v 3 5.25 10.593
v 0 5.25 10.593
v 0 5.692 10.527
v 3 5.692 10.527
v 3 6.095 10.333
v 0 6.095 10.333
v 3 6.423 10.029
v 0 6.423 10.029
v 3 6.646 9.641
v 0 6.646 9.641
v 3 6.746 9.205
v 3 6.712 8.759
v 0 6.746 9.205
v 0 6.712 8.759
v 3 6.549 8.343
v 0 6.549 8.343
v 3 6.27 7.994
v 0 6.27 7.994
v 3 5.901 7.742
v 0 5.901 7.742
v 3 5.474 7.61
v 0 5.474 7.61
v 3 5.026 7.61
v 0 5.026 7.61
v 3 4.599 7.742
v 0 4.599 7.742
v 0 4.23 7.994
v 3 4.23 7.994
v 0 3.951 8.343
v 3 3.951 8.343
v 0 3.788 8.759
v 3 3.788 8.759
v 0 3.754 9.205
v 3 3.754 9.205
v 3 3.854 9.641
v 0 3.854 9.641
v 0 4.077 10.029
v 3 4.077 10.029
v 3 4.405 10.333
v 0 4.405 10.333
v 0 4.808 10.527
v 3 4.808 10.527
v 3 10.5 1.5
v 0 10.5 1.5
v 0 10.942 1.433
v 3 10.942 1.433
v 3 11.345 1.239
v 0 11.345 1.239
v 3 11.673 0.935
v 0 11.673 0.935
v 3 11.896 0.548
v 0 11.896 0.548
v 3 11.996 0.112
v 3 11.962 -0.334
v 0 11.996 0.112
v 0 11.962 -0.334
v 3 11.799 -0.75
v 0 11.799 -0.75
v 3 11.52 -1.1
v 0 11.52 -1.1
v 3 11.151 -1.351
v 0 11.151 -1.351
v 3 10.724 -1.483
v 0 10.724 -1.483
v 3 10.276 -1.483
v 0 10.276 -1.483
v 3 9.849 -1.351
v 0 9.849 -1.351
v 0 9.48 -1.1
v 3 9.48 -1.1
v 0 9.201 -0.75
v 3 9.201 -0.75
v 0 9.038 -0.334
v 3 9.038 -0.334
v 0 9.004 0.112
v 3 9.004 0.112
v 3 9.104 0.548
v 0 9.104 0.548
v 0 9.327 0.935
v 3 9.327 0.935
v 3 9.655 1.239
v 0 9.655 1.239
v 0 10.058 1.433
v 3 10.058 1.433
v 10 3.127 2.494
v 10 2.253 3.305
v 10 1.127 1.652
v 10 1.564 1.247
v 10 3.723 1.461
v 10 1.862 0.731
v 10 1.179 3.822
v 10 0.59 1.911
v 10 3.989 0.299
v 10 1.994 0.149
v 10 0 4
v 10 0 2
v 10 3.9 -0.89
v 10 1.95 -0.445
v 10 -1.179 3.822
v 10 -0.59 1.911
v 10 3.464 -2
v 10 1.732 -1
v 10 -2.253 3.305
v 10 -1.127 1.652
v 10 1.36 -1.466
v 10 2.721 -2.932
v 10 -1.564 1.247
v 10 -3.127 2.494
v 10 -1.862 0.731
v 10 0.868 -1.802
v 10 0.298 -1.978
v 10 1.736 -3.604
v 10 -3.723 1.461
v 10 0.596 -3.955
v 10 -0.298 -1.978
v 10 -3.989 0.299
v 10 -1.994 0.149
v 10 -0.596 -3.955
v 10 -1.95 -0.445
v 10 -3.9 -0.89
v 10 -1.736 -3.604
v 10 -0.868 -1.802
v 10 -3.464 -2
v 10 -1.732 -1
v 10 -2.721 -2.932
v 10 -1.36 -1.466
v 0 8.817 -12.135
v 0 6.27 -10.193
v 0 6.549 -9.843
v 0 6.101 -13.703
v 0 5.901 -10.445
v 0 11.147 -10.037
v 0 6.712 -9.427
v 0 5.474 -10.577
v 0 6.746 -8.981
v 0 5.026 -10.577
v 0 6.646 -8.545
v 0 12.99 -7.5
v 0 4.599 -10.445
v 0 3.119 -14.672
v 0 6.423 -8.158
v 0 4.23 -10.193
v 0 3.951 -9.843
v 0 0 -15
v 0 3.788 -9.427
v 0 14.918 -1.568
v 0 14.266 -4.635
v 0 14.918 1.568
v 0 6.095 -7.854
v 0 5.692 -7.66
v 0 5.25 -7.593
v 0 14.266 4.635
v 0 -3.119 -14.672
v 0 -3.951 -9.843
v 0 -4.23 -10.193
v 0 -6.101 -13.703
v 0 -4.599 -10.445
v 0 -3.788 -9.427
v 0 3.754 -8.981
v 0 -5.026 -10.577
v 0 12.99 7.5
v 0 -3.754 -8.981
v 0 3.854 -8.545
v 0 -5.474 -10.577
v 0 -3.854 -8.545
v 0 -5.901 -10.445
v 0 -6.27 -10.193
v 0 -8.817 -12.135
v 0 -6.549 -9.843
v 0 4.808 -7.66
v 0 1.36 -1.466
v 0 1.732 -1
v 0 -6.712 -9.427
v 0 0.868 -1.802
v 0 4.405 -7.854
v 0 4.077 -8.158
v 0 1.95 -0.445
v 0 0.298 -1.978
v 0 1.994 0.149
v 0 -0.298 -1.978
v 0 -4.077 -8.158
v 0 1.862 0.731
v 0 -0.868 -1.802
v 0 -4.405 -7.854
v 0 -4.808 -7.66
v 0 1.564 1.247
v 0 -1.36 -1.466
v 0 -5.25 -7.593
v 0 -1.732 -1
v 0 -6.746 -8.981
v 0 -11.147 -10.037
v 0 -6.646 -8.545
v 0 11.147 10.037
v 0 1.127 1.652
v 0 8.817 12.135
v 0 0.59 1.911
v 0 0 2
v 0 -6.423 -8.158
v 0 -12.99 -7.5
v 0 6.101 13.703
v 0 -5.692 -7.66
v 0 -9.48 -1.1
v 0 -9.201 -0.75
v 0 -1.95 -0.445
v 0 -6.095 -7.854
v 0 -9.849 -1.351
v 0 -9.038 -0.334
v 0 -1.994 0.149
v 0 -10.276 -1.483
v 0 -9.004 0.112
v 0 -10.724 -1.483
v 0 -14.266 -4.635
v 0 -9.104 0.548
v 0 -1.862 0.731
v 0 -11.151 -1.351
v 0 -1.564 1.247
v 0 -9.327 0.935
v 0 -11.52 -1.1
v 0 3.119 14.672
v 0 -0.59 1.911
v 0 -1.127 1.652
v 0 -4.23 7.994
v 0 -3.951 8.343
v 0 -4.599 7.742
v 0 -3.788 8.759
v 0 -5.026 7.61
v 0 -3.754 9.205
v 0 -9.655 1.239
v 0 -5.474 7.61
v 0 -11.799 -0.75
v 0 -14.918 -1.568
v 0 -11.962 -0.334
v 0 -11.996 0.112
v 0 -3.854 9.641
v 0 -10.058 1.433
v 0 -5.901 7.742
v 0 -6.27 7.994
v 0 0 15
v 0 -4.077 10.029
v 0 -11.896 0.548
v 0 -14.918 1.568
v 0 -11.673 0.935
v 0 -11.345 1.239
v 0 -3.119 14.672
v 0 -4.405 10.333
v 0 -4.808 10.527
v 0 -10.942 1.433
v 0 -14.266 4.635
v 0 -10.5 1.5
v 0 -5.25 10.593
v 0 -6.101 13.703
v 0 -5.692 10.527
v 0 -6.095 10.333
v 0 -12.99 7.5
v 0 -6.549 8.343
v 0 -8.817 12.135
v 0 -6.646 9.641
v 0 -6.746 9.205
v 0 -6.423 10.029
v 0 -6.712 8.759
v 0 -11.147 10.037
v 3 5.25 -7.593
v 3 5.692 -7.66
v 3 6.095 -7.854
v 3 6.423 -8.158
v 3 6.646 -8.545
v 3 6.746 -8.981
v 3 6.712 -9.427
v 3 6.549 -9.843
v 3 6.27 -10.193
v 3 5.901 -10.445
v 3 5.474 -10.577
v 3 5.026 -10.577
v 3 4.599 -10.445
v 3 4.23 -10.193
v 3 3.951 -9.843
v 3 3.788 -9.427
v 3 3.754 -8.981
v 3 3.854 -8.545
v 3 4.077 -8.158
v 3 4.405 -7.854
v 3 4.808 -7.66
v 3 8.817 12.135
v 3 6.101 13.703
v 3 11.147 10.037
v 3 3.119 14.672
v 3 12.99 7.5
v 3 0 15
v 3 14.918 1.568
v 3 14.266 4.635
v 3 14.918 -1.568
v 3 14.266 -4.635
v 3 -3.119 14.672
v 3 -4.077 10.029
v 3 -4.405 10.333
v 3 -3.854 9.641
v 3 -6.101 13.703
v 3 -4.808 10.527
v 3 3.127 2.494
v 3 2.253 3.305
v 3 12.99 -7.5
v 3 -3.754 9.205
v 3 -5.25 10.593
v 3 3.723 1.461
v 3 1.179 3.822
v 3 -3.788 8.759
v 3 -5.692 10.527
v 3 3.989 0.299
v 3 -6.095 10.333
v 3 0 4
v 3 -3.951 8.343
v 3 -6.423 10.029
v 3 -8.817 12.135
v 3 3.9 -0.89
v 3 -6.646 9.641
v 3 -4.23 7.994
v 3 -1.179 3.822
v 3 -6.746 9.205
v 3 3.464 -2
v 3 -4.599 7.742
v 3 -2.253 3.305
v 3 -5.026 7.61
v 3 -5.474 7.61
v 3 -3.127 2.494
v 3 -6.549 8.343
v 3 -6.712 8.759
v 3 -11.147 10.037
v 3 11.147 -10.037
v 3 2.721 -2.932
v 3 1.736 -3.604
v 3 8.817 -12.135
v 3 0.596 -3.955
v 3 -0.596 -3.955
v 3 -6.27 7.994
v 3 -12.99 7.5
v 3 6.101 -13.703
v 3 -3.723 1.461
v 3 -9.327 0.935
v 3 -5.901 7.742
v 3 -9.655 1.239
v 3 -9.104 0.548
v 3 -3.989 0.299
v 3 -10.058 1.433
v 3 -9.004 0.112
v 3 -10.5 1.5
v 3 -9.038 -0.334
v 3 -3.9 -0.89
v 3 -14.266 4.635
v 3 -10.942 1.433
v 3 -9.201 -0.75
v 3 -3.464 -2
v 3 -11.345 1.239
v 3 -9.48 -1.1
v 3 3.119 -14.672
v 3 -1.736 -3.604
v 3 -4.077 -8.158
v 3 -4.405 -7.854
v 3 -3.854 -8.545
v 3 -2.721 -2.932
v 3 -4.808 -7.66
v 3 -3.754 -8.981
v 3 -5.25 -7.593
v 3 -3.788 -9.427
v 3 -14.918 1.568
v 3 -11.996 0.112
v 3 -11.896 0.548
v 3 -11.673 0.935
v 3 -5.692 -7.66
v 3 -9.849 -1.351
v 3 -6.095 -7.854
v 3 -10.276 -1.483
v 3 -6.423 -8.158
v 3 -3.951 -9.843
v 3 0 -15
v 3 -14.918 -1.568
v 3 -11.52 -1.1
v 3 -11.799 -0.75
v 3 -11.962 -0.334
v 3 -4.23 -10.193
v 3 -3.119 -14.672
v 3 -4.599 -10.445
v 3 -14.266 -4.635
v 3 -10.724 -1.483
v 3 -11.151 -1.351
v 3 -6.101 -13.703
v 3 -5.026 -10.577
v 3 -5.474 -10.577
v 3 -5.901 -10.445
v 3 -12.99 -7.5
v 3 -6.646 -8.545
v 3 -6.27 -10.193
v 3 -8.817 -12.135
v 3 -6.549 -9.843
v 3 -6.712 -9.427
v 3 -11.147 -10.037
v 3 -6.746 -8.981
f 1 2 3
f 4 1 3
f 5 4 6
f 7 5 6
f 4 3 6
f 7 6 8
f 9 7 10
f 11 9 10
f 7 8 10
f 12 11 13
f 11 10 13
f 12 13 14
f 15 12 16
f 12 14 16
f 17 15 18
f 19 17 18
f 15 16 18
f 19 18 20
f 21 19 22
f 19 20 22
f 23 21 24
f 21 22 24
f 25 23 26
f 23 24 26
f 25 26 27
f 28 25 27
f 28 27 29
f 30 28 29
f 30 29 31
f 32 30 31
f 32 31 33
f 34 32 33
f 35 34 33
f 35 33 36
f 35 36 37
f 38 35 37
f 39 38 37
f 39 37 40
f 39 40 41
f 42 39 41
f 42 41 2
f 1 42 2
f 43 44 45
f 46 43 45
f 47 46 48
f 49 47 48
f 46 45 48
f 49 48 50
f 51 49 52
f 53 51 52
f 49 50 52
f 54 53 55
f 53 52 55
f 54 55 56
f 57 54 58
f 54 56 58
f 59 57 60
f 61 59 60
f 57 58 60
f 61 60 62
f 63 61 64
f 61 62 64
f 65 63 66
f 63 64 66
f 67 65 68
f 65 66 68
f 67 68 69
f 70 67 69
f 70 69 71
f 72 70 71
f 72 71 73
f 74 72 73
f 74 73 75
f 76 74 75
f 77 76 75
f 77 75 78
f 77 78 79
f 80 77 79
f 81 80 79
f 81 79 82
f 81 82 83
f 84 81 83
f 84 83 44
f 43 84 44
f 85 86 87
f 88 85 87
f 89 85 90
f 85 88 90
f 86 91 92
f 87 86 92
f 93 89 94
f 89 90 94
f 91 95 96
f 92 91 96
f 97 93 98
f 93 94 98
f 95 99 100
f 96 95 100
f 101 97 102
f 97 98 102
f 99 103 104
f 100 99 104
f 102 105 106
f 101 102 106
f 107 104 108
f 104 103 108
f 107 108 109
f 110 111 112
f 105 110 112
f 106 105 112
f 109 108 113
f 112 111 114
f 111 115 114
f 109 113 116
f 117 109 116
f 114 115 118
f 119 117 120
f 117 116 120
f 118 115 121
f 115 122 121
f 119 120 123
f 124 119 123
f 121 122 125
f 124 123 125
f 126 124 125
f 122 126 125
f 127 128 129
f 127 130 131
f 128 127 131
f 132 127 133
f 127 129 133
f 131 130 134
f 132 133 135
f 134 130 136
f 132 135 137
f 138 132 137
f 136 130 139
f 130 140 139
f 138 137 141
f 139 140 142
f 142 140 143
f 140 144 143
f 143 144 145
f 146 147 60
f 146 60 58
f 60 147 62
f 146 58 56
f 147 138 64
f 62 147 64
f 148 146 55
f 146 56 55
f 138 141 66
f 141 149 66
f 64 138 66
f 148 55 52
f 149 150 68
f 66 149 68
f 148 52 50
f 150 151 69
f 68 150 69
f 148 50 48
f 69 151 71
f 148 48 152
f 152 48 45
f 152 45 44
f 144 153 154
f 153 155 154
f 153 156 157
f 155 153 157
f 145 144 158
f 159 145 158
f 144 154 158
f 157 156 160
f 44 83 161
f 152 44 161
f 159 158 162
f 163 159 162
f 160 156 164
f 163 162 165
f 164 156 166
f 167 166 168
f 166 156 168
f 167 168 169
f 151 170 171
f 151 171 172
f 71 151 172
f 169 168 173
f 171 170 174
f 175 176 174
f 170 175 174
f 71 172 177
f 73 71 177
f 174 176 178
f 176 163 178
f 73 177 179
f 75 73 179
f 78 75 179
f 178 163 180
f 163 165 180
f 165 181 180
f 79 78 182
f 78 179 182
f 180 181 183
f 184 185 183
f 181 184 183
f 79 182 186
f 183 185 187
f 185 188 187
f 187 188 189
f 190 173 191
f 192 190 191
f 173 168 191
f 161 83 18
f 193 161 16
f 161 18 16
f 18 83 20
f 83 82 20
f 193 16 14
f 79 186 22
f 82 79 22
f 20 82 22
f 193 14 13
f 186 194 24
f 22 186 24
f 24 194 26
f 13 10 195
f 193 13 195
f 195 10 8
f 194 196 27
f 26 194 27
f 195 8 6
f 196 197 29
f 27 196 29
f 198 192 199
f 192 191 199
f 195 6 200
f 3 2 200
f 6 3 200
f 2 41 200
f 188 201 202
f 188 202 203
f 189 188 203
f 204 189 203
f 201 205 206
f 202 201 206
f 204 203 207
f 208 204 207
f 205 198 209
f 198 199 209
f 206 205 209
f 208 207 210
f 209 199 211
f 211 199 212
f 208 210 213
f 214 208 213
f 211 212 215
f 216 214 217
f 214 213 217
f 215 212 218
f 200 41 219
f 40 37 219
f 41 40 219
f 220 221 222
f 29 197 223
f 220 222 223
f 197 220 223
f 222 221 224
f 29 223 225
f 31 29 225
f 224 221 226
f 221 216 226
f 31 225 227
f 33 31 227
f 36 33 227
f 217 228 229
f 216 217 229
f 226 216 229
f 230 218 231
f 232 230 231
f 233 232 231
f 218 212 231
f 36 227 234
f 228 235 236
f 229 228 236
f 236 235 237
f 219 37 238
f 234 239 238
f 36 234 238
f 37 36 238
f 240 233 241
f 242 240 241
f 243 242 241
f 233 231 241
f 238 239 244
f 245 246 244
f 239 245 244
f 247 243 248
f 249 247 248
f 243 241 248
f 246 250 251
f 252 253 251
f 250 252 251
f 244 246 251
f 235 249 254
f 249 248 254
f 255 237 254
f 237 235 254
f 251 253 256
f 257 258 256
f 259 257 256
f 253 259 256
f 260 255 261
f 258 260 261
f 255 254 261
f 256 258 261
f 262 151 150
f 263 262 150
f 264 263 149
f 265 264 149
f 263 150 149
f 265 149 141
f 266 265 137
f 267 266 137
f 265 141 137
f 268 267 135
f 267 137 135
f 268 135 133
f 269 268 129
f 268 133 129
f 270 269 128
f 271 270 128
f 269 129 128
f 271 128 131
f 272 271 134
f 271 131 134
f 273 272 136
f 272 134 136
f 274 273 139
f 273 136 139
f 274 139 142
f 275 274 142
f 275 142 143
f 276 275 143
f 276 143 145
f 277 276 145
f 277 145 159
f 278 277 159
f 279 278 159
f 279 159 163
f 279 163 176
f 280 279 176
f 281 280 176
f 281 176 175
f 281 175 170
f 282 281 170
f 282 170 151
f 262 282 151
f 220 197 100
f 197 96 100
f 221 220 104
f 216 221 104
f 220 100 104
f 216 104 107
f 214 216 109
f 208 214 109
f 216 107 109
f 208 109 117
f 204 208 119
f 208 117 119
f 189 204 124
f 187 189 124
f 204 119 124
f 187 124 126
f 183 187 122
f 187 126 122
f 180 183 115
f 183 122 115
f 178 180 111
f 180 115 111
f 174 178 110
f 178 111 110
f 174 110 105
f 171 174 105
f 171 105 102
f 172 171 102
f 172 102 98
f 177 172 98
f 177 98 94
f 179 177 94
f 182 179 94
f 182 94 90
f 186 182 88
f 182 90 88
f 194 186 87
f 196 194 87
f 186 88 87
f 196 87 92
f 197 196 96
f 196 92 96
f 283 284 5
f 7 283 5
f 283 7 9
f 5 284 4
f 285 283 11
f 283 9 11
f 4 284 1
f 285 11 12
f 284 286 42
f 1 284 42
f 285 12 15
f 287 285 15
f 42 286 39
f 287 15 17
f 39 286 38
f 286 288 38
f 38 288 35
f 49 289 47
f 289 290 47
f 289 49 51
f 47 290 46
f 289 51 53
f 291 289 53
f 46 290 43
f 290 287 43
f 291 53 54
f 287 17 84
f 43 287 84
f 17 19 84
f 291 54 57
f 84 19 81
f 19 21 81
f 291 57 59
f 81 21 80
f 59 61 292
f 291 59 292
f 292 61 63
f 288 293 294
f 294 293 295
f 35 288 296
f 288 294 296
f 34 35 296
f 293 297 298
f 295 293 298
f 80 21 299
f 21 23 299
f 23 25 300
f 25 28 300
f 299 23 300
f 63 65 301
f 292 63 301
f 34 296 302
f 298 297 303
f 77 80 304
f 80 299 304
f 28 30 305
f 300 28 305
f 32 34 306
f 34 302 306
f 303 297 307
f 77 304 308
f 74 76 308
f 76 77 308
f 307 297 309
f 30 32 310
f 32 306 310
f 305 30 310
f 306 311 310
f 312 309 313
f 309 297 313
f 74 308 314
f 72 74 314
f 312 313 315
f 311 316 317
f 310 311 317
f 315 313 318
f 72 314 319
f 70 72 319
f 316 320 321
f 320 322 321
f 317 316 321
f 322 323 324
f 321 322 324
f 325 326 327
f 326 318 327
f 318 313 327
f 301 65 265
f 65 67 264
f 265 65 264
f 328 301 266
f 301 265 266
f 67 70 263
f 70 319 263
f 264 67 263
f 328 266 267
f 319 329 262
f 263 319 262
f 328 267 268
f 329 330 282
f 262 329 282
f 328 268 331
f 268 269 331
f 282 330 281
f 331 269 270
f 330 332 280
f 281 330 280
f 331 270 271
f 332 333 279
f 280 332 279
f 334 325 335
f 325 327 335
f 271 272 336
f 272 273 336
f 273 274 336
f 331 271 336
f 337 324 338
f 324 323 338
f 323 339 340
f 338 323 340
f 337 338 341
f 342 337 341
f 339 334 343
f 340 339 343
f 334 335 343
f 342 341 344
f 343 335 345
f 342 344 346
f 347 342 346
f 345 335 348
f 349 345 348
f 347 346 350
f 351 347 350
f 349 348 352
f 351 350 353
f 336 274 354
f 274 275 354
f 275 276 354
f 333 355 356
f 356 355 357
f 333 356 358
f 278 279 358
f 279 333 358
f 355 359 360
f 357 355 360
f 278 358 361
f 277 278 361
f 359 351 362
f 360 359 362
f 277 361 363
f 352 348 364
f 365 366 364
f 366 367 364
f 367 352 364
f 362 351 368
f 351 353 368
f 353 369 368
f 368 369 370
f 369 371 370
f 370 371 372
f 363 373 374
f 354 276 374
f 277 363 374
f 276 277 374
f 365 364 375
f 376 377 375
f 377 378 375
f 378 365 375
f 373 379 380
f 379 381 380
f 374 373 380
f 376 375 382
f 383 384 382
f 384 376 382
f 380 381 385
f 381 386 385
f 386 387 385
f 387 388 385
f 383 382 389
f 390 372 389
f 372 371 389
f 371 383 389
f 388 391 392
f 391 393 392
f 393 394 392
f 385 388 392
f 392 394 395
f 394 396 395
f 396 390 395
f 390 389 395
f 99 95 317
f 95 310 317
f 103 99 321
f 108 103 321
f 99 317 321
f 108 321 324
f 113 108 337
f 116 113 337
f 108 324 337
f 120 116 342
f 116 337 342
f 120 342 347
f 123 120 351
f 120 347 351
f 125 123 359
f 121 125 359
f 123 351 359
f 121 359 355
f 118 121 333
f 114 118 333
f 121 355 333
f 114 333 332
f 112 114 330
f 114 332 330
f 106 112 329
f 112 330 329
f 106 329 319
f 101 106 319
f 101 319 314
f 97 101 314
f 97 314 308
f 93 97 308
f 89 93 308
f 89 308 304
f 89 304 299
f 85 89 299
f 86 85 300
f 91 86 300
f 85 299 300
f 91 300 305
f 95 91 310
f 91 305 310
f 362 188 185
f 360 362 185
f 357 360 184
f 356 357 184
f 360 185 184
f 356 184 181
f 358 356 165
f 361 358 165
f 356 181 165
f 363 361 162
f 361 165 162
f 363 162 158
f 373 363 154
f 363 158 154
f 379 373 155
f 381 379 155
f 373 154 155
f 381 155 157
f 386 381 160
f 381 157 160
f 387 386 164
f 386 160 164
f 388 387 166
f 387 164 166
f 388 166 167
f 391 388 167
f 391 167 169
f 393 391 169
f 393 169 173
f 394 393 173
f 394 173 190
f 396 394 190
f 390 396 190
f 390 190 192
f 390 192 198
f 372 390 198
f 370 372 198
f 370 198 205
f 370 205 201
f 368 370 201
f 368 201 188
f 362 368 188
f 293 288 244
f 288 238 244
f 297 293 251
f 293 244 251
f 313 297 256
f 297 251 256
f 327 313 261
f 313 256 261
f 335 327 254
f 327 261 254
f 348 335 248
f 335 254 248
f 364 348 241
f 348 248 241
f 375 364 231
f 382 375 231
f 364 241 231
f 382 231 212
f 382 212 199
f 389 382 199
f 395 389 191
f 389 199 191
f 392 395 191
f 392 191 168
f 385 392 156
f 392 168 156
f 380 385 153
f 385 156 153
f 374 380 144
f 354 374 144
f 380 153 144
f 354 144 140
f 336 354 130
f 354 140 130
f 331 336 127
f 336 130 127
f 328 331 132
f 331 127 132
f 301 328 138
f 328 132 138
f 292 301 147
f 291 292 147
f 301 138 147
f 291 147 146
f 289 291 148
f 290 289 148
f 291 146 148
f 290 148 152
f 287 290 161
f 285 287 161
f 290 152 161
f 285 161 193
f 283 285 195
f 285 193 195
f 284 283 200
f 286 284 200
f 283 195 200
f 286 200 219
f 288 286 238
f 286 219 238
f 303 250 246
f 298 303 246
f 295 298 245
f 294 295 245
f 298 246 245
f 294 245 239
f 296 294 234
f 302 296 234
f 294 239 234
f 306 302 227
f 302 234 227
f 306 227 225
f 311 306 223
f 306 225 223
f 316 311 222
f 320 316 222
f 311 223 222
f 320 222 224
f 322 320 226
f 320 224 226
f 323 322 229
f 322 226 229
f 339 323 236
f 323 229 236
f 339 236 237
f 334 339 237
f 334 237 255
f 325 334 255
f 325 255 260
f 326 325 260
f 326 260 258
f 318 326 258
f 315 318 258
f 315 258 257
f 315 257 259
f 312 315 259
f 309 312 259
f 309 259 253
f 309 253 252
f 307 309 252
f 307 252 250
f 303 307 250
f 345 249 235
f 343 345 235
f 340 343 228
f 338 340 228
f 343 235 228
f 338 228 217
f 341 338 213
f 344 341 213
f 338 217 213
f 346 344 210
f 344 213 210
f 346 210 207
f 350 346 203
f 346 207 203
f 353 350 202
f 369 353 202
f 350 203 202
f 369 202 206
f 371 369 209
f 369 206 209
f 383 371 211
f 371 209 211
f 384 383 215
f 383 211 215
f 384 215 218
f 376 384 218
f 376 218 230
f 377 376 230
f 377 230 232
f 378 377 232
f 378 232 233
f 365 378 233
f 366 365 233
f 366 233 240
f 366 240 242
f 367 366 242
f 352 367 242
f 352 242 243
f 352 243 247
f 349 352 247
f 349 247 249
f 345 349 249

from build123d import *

# Parameters (mm, degrees)
SKETCH2_R          = 1.5
CUT_EXTRUDE5_DEPTH = 24.452078799


with BuildPart() as part:
    # Sketch1 → Revolve1 (revolve)
    with BuildSketch(Plane.XY, mode=Mode.PRIVATE) as revolve1_sk:
        Polygon((10, 4), (3, 4), (3, 15), (0, 15), (0, 2), (10, 2), align=None)
    revolve(revolve1_sk.sketch.rotate(Axis((0, 0, 0), (1, 0, 0)), 90), axis=Axis((0, 0, 0), (1, 0, 0)))

    # Sketch2 → Cut-Extrude5 (cut, through all)
    with BuildSketch(Plane.ZY):
        with Locations((0, 10.5)):
            Circle(SKETCH2_R)
        with Locations((9.09326674, 5.25)):
            Circle(SKETCH2_R)
        with Locations((9.09326674, -5.25)):
            Circle(SKETCH2_R)
        with Locations((0, -10.5)):
            Circle(SKETCH2_R)
        with Locations((-9.09326674, -5.25)):
            Circle(SKETCH2_R)
        with Locations((-9.09326674, 5.25)):
            Circle(SKETCH2_R)
    extrude(amount=-CUT_EXTRUDE5_DEPTH, mode=Mode.SUBTRACT)


solid = part.part
